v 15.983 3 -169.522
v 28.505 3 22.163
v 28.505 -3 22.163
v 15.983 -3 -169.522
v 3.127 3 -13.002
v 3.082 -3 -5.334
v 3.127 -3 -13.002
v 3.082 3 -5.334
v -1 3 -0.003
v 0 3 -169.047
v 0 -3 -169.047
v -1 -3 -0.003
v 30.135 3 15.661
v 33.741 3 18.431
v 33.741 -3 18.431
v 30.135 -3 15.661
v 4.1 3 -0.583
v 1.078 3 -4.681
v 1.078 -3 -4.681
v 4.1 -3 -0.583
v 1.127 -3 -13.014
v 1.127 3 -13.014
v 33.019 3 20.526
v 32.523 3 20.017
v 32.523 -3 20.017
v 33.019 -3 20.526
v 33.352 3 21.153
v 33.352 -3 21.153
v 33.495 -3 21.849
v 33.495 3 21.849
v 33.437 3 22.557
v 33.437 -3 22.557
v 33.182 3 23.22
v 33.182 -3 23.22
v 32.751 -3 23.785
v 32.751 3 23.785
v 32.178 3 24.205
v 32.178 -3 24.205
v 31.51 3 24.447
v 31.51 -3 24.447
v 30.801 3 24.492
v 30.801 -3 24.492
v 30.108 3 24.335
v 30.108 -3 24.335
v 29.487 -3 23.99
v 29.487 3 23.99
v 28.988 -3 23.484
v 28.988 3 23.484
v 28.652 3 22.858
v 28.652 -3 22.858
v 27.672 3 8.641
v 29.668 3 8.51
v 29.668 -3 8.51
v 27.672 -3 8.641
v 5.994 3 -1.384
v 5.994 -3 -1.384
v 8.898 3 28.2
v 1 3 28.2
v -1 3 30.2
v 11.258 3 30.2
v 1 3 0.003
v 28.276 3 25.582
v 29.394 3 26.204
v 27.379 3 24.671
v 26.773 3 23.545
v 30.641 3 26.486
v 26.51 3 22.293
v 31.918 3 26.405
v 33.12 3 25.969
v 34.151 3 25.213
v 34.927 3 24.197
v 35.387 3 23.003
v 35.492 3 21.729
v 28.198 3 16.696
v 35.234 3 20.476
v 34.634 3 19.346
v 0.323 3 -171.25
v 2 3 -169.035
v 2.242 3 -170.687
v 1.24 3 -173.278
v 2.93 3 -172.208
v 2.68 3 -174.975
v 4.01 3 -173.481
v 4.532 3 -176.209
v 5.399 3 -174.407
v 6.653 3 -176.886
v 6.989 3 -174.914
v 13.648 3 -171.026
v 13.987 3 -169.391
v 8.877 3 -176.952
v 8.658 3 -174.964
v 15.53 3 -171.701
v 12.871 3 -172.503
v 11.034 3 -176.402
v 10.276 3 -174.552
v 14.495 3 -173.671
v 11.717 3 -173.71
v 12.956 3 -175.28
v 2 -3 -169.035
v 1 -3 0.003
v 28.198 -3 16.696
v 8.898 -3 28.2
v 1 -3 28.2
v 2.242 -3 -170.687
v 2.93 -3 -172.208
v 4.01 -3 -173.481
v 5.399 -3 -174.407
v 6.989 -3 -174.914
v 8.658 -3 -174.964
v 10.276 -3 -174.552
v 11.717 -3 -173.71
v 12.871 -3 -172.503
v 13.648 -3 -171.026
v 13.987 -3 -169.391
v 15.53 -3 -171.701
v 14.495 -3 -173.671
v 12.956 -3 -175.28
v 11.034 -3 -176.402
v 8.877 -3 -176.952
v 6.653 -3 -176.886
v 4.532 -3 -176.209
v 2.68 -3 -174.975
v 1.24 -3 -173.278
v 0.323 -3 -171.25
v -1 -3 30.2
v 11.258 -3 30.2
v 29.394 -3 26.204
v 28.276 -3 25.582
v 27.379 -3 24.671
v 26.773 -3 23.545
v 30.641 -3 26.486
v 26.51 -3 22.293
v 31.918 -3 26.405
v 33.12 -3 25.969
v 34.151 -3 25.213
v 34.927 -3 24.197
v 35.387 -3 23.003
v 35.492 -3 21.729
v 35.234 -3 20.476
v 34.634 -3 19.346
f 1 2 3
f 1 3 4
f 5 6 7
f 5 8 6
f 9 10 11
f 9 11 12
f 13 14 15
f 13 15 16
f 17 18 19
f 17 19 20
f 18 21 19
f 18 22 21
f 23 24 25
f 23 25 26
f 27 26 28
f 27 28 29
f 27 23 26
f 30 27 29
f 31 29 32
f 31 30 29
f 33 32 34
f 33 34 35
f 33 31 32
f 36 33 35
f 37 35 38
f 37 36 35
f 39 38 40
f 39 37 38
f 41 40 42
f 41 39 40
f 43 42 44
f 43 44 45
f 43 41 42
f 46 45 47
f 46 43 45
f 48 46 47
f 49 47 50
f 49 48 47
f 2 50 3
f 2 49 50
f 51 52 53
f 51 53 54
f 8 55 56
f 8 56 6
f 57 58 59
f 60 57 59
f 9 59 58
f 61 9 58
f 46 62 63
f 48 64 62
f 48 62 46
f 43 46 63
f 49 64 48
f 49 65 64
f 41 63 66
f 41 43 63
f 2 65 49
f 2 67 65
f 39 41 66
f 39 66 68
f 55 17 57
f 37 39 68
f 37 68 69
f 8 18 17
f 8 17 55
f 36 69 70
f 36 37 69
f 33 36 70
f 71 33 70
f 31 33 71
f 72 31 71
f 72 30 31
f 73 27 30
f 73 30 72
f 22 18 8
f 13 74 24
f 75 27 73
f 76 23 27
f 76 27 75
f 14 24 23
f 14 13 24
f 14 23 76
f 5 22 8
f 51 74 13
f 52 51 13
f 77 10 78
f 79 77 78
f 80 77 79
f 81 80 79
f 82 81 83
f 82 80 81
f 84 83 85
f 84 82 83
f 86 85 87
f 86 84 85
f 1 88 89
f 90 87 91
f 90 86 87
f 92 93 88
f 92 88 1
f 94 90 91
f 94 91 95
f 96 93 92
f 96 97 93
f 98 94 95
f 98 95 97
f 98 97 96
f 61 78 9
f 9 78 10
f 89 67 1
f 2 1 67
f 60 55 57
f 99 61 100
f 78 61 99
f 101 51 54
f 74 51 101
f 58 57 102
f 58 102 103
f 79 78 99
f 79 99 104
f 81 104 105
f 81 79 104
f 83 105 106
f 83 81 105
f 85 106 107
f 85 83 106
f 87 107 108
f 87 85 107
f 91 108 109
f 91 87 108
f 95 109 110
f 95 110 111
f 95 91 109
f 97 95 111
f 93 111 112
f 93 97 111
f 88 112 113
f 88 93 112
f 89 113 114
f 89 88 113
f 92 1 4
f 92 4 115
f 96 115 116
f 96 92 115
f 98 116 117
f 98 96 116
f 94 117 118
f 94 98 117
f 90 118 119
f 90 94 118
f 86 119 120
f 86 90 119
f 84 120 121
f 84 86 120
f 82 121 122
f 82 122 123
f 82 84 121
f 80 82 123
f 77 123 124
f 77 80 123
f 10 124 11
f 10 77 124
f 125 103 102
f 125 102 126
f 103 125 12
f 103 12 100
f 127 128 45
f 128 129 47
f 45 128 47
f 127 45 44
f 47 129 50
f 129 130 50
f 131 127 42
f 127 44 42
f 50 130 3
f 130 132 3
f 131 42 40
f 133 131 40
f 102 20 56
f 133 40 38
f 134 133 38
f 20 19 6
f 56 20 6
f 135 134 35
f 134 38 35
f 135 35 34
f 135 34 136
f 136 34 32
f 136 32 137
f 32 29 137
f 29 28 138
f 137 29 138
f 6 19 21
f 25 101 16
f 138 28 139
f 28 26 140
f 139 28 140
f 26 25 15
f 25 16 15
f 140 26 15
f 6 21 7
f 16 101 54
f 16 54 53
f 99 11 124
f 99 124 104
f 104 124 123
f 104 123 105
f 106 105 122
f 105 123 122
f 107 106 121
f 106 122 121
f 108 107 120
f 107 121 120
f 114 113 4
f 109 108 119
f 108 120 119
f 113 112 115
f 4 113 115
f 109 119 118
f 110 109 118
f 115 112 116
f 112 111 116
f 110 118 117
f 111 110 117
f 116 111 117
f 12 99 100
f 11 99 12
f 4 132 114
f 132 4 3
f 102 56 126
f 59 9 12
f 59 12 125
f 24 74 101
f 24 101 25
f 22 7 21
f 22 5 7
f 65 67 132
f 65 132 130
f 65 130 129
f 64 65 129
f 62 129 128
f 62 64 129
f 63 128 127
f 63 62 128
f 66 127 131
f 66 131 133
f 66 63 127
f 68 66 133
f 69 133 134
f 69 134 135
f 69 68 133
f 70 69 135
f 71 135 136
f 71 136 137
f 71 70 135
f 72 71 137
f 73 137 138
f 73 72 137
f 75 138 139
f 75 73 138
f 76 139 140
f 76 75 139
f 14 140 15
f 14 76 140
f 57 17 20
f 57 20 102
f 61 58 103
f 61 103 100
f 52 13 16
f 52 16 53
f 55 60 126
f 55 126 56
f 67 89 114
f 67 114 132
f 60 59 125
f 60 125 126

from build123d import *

# Parameters (mm, degrees)
EXTRUDE_THIN3_DEPTH = 3


with BuildPart() as part:
    # Sketch1 → Extrude-Thin3 (new, symmetric)
    with BuildSketch(Plane(origin=(0, 0, 0), x_dir=(1, 0, 0), z_dir=(0, 1, 0))):
        with BuildLine():
            Line((1.127012176, 13.013546351), (1.077715548, 4.681395496))
            Line((1.077715548, 4.681395496), (4.100420922, 0.582923517))
            Line((4.100420922, 0.582923517), (8.897574841, -28.2))
            Line((8.897574841, -28.2), (1, -28.2))
            Line((1, -28.2), (1, -0.002958192))
            Line((1, -0.002958192), (2.00010501, 169.035497988))
            ThreePointArc((2.00010501, 169.035497988), (7.822069743, 174.997361155), (13.987237653, 169.39113333))
            Line((13.987237653, 169.39113333), (26.50957176, -22.293349997))
            ThreePointArc((26.50957176, -22.293349997), (33.11993484, -25.969367239), (33.741089124, -18.431186413))
            Line((33.741089124, -18.431186413), (30.134955883, -15.661433283))
            Line((30.134955883, -15.661433283), (29.667792354, -8.510370309))
            Line((29.667792354, -8.510370309), (27.672046469, -8.640748086))
            Line((27.672046469, -8.640748086), (28.198263672, -16.695769752))
            Line((28.198263672, -16.695769752), (32.522827291, -20.017325785))
            ThreePointArc((32.522827291, -20.017325785), (32.177741578, -24.205204022), (28.505317644, -22.162972221))
            Line((28.505317644, -22.162972221), (15.982983538, 169.521511107))
            ThreePointArc((15.982983538, 169.521511107), (7.762759658, 176.99648154), (0.000140013, 169.04733065))
            Line((0.000140013, 169.04733065), (-1, 0.002958192))
            Line((-1, 0.002958192), (-1, -30.2))
            Line((-1, -30.2), (11.258495684, -30.2))
            Line((11.258495684, -30.2), (5.994431581, 1.384384622))
            Line((5.994431581, 1.384384622), (3.081610843, 5.333864542))
            Line((3.081610843, 5.333864542), (3.126977173, 13.001713688))
            Line((3.126977173, 13.001713688), (1.127012176, 13.013546351))
        make_face()
    extrude(amount=EXTRUDE_THIN3_DEPTH, both=True)


solid = part.part
